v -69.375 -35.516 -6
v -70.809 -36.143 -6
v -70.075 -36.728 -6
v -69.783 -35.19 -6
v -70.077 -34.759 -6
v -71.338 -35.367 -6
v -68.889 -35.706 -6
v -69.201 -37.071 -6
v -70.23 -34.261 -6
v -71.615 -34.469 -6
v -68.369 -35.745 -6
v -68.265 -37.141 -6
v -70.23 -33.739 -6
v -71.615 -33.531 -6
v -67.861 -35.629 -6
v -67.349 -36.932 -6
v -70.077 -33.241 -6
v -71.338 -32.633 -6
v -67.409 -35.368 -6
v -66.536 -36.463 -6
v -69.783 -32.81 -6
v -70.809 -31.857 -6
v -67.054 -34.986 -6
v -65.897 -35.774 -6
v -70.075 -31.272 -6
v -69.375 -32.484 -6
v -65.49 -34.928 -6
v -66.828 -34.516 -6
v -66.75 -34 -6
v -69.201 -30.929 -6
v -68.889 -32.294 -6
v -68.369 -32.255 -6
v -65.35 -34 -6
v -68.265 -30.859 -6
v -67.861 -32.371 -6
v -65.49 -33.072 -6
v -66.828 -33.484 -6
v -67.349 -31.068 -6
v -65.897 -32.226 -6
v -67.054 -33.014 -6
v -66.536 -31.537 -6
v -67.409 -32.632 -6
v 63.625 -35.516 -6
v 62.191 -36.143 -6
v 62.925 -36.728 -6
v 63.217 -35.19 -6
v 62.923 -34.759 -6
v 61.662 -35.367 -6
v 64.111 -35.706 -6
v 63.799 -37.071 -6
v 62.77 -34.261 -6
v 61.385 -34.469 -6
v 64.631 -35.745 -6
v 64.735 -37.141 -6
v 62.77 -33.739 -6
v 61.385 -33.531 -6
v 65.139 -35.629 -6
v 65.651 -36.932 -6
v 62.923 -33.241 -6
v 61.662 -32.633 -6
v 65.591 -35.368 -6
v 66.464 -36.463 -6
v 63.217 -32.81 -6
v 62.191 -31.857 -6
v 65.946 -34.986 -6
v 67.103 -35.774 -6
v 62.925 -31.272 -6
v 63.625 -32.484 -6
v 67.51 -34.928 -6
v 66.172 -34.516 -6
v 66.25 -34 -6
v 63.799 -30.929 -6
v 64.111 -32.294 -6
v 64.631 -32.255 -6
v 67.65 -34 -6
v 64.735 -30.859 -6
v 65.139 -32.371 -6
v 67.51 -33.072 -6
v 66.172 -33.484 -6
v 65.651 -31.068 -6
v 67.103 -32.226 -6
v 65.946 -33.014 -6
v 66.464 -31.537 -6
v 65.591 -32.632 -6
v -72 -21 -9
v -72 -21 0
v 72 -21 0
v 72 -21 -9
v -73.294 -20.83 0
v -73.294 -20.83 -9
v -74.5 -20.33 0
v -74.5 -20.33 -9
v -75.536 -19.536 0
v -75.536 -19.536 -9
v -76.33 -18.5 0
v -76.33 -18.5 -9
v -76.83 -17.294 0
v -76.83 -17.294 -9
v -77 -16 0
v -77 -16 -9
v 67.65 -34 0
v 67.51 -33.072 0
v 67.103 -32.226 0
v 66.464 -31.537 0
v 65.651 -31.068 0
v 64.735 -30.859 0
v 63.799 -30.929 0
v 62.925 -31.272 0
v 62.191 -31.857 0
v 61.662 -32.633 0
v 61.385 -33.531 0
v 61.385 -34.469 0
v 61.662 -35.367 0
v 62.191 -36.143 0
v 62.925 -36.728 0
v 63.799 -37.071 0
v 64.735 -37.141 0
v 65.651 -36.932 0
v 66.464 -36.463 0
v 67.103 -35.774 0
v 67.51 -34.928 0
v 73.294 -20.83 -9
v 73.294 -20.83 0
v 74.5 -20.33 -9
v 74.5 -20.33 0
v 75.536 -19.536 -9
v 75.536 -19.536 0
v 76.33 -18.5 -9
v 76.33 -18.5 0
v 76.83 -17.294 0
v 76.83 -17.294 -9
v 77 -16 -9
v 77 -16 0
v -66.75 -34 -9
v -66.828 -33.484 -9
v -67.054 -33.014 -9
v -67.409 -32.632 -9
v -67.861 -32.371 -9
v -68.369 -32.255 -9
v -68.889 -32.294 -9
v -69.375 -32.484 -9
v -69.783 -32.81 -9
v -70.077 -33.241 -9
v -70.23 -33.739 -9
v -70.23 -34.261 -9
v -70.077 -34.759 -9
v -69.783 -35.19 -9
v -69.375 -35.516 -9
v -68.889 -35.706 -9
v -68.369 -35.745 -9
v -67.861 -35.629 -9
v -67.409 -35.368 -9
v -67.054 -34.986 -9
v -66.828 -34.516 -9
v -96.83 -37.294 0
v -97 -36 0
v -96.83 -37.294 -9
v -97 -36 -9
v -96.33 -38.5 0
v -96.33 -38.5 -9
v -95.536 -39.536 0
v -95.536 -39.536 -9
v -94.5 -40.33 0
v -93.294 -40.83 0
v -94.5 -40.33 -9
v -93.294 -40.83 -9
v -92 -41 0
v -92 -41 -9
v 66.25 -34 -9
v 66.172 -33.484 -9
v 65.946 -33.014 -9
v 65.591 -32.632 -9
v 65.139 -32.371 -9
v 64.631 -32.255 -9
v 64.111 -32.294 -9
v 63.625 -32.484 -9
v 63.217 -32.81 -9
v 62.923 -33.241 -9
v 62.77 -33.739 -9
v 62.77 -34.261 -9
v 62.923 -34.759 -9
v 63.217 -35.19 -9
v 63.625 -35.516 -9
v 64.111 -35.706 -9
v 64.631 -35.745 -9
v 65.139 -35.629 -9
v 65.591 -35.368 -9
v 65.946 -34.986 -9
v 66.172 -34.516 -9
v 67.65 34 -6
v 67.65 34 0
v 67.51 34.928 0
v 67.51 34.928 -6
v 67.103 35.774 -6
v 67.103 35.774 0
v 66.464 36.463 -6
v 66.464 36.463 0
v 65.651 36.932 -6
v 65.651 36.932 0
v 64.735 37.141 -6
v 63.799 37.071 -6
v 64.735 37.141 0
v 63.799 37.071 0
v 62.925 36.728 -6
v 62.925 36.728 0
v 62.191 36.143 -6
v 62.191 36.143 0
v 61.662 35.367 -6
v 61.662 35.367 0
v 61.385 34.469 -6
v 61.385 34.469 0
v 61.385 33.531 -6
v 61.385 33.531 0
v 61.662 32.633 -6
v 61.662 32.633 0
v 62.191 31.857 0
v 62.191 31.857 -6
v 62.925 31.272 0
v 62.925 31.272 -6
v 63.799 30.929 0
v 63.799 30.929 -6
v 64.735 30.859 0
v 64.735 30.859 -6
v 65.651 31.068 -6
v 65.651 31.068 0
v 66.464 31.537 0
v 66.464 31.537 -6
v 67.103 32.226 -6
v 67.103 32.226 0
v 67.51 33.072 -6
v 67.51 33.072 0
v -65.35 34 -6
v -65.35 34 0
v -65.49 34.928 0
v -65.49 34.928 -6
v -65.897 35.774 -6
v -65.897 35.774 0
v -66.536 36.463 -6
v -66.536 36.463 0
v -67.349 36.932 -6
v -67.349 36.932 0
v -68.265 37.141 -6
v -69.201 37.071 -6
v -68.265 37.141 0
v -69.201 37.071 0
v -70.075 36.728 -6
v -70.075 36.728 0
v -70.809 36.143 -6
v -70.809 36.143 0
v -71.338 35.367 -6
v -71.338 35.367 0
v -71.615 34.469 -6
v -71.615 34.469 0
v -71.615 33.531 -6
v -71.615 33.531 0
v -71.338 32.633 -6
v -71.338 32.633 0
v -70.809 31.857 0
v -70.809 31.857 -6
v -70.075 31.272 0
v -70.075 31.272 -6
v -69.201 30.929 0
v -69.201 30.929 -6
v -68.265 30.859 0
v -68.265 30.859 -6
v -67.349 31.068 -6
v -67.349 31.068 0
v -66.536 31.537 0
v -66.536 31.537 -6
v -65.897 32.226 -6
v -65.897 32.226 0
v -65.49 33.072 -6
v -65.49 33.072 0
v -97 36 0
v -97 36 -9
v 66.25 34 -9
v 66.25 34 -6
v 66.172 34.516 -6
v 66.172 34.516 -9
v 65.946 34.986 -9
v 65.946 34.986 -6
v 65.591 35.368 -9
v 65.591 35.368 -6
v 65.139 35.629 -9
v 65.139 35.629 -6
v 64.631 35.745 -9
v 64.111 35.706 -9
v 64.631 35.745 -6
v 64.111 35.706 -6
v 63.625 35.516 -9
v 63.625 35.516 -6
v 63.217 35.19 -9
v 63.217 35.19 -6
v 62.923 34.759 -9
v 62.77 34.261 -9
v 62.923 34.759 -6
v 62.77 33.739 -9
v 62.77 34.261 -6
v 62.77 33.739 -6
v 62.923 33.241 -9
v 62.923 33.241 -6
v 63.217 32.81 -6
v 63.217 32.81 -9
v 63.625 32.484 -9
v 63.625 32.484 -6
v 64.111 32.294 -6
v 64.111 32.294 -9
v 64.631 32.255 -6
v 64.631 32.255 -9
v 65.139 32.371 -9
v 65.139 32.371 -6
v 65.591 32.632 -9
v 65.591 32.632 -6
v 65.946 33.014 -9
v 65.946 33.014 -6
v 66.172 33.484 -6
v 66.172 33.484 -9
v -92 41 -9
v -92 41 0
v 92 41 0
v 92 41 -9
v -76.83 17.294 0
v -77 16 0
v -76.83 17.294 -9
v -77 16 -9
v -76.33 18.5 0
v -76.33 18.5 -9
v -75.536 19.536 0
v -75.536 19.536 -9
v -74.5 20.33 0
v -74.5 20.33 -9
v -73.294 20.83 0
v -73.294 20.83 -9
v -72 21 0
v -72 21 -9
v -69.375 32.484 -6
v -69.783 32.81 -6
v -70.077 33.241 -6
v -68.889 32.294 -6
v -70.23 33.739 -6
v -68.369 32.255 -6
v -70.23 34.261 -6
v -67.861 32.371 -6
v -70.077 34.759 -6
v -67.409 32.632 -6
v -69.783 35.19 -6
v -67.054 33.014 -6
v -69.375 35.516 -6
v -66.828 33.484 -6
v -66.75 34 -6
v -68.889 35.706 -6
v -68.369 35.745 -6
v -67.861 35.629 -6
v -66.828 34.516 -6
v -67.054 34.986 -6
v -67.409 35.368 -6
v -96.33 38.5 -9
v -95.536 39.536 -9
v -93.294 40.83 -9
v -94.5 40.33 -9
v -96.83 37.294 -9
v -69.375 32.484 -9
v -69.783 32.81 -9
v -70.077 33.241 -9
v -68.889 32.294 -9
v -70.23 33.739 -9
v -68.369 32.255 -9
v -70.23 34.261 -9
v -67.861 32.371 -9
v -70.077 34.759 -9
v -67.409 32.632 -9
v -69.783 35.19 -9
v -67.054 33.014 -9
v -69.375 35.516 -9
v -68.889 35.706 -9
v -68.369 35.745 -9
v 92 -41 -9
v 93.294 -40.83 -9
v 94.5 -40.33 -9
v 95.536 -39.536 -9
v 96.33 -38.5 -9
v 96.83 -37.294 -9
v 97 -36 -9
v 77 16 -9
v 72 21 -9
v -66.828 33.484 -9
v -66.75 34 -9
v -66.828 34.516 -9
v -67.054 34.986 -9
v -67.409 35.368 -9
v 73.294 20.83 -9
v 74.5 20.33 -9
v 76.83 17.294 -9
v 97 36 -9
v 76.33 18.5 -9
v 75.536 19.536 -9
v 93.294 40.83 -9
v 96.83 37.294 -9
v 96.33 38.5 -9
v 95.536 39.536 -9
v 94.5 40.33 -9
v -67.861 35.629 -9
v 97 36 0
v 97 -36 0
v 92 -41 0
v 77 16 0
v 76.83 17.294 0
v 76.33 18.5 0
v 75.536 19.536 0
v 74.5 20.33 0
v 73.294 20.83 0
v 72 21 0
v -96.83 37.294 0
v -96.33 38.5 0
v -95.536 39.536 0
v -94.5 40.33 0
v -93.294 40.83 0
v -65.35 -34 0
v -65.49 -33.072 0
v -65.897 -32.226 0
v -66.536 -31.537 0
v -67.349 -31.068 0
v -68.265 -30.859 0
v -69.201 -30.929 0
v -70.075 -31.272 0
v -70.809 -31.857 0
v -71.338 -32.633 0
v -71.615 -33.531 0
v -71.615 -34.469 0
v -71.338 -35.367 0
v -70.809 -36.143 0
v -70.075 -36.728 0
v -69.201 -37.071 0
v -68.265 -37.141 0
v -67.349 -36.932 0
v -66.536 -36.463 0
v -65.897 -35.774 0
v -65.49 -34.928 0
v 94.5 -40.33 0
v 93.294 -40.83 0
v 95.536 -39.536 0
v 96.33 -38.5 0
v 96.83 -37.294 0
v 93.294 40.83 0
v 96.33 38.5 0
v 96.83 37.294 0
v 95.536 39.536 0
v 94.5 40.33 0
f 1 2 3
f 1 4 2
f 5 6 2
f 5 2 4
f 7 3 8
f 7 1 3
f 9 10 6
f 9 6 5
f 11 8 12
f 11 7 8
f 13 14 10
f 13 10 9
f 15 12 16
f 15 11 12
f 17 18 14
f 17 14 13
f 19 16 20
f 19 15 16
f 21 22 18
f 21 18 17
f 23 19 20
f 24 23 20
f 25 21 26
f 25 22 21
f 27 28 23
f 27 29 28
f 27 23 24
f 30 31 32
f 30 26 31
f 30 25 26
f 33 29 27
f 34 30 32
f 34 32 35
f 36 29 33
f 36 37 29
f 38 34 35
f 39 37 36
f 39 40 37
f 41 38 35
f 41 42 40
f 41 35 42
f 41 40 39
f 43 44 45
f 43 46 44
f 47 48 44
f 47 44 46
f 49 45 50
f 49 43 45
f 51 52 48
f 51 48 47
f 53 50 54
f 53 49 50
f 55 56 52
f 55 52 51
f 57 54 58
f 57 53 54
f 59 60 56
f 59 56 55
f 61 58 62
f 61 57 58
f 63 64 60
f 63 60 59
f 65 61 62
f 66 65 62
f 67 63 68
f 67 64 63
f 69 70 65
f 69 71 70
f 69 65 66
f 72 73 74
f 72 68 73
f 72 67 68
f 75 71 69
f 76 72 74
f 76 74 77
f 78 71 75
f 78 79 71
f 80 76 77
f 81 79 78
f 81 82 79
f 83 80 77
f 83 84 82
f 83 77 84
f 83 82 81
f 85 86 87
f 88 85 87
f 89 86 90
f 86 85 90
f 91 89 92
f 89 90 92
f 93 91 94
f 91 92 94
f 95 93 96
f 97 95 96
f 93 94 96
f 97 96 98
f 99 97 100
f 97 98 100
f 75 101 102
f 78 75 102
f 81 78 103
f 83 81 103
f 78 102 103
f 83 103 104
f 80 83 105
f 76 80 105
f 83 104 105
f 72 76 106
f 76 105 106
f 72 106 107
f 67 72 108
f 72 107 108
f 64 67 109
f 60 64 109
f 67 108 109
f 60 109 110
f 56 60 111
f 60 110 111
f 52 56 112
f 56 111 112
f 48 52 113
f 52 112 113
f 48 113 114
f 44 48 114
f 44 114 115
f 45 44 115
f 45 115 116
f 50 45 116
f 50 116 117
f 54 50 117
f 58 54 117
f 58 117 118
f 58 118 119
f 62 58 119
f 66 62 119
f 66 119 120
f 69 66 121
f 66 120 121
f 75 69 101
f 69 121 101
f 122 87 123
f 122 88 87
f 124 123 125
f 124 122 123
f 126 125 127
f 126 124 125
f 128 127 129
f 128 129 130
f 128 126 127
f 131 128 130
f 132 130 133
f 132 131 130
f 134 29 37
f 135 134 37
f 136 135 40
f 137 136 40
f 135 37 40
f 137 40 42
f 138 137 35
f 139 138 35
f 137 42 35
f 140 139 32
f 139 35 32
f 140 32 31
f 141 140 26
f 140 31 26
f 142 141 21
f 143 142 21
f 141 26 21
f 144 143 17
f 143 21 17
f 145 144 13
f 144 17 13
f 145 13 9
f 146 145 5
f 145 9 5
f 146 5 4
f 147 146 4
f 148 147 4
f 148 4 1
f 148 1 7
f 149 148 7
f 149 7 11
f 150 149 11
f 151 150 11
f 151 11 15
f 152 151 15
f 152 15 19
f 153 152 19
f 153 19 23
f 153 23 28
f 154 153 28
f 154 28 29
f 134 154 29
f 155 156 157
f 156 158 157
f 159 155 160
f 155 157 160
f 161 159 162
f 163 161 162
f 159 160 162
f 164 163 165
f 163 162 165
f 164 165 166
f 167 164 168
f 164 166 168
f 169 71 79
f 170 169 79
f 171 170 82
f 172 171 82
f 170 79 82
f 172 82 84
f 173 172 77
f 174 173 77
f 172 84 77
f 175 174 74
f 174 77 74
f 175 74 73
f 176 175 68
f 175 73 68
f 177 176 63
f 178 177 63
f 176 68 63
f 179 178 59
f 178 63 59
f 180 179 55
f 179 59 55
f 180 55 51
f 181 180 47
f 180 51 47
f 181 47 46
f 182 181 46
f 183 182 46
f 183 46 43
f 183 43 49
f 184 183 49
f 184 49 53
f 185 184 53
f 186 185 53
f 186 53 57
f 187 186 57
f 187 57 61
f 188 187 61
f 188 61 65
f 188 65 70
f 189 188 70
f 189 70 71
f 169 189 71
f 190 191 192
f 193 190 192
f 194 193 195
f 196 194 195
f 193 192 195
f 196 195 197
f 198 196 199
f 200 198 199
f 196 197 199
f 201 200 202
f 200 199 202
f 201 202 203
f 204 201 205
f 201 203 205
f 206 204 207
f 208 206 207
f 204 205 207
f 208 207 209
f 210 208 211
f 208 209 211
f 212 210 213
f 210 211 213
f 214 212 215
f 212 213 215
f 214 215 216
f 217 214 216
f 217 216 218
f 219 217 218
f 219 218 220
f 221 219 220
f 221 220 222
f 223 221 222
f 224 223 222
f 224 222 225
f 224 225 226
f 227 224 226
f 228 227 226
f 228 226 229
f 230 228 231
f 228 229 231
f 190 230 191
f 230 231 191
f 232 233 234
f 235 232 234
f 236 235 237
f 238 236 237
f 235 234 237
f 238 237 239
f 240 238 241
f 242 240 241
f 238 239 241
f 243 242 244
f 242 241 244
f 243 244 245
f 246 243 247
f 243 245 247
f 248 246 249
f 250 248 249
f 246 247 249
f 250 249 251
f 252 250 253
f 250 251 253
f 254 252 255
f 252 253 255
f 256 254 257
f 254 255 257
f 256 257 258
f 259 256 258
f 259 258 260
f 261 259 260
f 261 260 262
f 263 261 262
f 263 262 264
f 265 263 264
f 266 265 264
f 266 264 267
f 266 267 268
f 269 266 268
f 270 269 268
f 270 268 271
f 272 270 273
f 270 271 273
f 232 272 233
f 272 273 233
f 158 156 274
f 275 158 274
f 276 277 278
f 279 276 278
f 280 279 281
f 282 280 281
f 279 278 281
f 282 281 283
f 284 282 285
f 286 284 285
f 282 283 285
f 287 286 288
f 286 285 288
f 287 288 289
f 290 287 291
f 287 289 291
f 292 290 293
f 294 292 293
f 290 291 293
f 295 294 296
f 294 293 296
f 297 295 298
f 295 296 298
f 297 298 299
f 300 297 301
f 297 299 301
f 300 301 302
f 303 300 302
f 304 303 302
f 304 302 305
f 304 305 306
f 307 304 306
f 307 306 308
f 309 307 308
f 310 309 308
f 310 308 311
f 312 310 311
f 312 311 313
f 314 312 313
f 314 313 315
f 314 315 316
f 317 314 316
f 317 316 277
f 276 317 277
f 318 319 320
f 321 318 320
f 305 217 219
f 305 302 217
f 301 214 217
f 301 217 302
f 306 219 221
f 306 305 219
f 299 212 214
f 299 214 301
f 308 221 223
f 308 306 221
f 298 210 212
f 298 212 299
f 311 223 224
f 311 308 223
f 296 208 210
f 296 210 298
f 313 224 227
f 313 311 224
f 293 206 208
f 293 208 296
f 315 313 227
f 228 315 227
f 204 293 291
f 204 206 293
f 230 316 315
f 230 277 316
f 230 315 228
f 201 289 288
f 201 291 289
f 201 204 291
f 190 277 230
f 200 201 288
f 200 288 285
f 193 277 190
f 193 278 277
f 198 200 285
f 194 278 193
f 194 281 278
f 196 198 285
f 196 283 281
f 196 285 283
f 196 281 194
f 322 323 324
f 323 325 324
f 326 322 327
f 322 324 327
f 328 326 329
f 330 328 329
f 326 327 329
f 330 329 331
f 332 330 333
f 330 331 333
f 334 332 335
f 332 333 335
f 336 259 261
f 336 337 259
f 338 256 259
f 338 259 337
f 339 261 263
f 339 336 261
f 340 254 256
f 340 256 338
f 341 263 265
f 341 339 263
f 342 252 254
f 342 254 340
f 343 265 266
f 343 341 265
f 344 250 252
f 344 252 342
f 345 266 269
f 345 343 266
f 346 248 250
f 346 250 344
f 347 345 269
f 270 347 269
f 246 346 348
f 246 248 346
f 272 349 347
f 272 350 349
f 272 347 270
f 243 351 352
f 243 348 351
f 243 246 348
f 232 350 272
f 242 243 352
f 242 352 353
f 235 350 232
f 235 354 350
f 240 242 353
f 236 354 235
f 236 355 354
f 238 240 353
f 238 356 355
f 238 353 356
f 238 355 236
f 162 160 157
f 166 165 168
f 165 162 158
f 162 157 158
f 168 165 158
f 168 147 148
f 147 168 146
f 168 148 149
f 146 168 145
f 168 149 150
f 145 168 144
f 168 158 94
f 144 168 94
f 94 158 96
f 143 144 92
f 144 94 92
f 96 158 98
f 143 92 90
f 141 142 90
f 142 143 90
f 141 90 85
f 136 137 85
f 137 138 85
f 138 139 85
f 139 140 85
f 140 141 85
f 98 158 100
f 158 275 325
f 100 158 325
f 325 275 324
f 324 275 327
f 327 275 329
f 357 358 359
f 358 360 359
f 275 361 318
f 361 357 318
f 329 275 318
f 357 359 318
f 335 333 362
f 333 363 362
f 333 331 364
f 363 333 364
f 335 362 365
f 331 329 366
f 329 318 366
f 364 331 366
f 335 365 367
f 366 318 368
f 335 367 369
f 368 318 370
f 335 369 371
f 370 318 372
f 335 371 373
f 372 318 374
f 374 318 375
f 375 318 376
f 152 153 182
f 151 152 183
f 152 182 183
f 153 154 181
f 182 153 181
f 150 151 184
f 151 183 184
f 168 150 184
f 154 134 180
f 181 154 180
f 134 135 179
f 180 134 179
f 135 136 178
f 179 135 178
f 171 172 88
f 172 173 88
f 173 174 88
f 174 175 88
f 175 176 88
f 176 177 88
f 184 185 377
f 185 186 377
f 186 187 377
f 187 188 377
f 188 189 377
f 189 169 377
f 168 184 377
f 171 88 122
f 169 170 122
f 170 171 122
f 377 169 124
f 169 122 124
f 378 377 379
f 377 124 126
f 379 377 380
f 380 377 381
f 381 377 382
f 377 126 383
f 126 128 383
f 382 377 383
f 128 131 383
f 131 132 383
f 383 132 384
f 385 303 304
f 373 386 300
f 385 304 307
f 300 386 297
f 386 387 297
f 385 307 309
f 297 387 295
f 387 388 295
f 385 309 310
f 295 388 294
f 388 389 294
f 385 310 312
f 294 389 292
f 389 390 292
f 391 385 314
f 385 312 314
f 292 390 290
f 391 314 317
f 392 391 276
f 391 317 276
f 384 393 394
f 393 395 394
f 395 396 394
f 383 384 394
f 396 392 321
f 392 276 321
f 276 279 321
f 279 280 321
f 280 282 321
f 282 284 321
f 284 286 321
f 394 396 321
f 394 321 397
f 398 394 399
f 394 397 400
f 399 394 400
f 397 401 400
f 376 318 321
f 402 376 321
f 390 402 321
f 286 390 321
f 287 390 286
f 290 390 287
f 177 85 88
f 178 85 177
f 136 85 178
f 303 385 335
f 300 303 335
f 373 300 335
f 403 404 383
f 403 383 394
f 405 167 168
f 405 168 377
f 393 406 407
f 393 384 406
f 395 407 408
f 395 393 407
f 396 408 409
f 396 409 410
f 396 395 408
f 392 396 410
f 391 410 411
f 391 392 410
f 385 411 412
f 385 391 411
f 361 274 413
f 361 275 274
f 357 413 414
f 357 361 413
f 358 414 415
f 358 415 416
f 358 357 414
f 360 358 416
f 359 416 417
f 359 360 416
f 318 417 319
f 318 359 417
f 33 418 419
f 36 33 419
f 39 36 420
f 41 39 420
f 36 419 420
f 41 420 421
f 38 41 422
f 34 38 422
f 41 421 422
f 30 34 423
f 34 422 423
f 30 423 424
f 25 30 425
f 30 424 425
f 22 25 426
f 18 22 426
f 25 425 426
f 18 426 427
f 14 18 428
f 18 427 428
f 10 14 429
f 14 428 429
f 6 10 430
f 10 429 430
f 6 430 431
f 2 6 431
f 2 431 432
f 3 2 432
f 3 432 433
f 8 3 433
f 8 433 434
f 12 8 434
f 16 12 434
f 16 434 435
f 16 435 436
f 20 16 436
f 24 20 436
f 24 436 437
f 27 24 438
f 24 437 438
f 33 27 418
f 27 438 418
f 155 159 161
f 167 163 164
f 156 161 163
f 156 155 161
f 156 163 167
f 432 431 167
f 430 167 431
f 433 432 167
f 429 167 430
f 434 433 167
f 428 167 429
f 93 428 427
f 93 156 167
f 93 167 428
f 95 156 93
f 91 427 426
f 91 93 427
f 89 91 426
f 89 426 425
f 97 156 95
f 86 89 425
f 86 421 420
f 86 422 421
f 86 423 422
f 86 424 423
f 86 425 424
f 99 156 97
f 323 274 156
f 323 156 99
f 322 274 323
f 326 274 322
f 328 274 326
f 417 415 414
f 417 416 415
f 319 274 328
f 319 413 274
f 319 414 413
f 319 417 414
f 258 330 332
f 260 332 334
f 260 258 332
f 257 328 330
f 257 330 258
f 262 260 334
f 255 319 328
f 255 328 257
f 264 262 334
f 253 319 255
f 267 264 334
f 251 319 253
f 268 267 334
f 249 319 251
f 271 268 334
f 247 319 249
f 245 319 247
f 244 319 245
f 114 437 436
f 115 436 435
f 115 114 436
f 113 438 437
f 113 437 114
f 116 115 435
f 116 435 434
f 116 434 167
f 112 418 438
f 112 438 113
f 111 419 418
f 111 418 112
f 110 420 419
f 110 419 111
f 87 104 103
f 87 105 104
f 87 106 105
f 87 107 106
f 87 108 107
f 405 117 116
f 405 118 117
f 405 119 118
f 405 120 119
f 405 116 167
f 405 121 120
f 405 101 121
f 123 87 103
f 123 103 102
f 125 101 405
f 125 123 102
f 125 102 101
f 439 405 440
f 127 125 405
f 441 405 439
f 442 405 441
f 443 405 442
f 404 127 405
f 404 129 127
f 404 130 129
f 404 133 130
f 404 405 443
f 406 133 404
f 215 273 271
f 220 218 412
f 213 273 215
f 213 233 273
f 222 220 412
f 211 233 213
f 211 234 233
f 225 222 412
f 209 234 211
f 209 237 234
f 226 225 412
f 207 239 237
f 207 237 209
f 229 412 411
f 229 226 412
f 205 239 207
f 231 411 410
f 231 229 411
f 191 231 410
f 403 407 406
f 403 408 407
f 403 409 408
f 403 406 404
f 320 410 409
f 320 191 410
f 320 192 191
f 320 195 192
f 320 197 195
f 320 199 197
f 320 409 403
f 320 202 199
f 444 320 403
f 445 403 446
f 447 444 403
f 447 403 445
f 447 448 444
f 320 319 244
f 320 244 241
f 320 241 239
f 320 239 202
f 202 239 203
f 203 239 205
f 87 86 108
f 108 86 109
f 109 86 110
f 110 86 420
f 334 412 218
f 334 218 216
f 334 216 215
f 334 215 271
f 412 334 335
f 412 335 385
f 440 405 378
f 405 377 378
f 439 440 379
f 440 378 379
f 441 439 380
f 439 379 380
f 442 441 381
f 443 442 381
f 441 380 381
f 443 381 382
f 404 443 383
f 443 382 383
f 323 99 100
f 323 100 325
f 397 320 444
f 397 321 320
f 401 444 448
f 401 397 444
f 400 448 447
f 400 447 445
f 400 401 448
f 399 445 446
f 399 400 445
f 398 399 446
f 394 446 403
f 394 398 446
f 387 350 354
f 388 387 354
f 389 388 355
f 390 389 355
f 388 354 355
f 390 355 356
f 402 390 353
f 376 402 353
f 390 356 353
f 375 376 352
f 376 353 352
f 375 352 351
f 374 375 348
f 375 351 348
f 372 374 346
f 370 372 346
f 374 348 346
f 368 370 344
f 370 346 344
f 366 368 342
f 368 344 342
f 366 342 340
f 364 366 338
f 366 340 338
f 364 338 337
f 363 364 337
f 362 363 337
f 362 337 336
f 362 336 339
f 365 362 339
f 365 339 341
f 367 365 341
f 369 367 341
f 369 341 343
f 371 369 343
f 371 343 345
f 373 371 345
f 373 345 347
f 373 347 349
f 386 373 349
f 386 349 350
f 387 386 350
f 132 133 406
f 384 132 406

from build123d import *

# Parameters (mm, degrees)
F0_W     = 194
F0_H     = 82
F0_R     = 3.15
F0_W_2   = 154
F0_H_2   = 42
F0_R_2   = 1.75
F1_DEPTH = 9
F2_DEPTH = 6
F3_R     = 5


# Not quite as in the source:
# - a feature names something its author has since deleted; it is built from what else it names


with BuildPart() as f1:
    # F0 (on Top) → F1 (new body)
    with BuildSketch(Plane.XY):
        Rectangle(F0_W, F0_H)
        with Locations((-68.5, -34)):
            Circle(F0_R, mode=Mode.SUBTRACT)
        with Locations((64.5, -34)):
            Circle(F0_R, mode=Mode.SUBTRACT)
        with Locations((-68.5, 34)):
            Circle(F0_R, mode=Mode.SUBTRACT)
        Rectangle(F0_W_2, F0_H_2, mode=Mode.SUBTRACT)
        with Locations((64.5, 34)):
            Circle(F0_R, mode=Mode.SUBTRACT)
        with Locations((-68.5, 34)):
            Circle(F0_R)
        with Locations((-68.5, 34)):
            Circle(F0_R_2, mode=Mode.SUBTRACT)
        with Locations((-68.5, -34)):
            Circle(F0_R)
        with Locations((-68.5, -34)):
            Circle(F0_R_2, mode=Mode.SUBTRACT)
        with Locations((64.5, 34)):
            Circle(F0_R)
        with Locations((64.5, 34)):
            Circle(F0_R_2, mode=Mode.SUBTRACT)
        with Locations((64.5, -34)):
            Circle(F0_R)
        with Locations((64.5, -34)):
            Circle(F0_R_2, mode=Mode.SUBTRACT)
    extrude(amount=-F1_DEPTH)

    # F0 (on Top) → F2 (cut)
    with BuildSketch(Plane.XY):
        with Locations((-68.5, 34)):
            Circle(F0_R)
        with Locations((-68.5, 34)):
            Circle(F0_R_2, mode=Mode.SUBTRACT)
        with Locations((-68.5, -34)):
            Circle(F0_R)
        with Locations((-68.5, -34)):
            Circle(F0_R_2, mode=Mode.SUBTRACT)
        with Locations((64.5, 34)):
            Circle(F0_R)
        with Locations((64.5, 34)):
            Circle(F0_R_2, mode=Mode.SUBTRACT)
        with Locations((64.5, -34)):
            Circle(F0_R)
        with Locations((64.5, -34)):
            Circle(F0_R_2, mode=Mode.SUBTRACT)
    extrude(amount=-F2_DEPTH, mode=Mode.SUBTRACT)

    # F3
    f3_edges = [f1.edges().sort_by_distance(p)[0] for p in [
        (97, 41, -4.5),
        (-97, 41, -4.5),
        (-97, -41, -4.5),
        (97, -41, -4.5),
        (-77, 21, -4.5),
        (77, 21, -4.5),
        (77, -21, -4.5),
        (-77, -21, -4.5),
    ]]
    fillet(f3_edges, radius=F3_R)


solid = f1.part
